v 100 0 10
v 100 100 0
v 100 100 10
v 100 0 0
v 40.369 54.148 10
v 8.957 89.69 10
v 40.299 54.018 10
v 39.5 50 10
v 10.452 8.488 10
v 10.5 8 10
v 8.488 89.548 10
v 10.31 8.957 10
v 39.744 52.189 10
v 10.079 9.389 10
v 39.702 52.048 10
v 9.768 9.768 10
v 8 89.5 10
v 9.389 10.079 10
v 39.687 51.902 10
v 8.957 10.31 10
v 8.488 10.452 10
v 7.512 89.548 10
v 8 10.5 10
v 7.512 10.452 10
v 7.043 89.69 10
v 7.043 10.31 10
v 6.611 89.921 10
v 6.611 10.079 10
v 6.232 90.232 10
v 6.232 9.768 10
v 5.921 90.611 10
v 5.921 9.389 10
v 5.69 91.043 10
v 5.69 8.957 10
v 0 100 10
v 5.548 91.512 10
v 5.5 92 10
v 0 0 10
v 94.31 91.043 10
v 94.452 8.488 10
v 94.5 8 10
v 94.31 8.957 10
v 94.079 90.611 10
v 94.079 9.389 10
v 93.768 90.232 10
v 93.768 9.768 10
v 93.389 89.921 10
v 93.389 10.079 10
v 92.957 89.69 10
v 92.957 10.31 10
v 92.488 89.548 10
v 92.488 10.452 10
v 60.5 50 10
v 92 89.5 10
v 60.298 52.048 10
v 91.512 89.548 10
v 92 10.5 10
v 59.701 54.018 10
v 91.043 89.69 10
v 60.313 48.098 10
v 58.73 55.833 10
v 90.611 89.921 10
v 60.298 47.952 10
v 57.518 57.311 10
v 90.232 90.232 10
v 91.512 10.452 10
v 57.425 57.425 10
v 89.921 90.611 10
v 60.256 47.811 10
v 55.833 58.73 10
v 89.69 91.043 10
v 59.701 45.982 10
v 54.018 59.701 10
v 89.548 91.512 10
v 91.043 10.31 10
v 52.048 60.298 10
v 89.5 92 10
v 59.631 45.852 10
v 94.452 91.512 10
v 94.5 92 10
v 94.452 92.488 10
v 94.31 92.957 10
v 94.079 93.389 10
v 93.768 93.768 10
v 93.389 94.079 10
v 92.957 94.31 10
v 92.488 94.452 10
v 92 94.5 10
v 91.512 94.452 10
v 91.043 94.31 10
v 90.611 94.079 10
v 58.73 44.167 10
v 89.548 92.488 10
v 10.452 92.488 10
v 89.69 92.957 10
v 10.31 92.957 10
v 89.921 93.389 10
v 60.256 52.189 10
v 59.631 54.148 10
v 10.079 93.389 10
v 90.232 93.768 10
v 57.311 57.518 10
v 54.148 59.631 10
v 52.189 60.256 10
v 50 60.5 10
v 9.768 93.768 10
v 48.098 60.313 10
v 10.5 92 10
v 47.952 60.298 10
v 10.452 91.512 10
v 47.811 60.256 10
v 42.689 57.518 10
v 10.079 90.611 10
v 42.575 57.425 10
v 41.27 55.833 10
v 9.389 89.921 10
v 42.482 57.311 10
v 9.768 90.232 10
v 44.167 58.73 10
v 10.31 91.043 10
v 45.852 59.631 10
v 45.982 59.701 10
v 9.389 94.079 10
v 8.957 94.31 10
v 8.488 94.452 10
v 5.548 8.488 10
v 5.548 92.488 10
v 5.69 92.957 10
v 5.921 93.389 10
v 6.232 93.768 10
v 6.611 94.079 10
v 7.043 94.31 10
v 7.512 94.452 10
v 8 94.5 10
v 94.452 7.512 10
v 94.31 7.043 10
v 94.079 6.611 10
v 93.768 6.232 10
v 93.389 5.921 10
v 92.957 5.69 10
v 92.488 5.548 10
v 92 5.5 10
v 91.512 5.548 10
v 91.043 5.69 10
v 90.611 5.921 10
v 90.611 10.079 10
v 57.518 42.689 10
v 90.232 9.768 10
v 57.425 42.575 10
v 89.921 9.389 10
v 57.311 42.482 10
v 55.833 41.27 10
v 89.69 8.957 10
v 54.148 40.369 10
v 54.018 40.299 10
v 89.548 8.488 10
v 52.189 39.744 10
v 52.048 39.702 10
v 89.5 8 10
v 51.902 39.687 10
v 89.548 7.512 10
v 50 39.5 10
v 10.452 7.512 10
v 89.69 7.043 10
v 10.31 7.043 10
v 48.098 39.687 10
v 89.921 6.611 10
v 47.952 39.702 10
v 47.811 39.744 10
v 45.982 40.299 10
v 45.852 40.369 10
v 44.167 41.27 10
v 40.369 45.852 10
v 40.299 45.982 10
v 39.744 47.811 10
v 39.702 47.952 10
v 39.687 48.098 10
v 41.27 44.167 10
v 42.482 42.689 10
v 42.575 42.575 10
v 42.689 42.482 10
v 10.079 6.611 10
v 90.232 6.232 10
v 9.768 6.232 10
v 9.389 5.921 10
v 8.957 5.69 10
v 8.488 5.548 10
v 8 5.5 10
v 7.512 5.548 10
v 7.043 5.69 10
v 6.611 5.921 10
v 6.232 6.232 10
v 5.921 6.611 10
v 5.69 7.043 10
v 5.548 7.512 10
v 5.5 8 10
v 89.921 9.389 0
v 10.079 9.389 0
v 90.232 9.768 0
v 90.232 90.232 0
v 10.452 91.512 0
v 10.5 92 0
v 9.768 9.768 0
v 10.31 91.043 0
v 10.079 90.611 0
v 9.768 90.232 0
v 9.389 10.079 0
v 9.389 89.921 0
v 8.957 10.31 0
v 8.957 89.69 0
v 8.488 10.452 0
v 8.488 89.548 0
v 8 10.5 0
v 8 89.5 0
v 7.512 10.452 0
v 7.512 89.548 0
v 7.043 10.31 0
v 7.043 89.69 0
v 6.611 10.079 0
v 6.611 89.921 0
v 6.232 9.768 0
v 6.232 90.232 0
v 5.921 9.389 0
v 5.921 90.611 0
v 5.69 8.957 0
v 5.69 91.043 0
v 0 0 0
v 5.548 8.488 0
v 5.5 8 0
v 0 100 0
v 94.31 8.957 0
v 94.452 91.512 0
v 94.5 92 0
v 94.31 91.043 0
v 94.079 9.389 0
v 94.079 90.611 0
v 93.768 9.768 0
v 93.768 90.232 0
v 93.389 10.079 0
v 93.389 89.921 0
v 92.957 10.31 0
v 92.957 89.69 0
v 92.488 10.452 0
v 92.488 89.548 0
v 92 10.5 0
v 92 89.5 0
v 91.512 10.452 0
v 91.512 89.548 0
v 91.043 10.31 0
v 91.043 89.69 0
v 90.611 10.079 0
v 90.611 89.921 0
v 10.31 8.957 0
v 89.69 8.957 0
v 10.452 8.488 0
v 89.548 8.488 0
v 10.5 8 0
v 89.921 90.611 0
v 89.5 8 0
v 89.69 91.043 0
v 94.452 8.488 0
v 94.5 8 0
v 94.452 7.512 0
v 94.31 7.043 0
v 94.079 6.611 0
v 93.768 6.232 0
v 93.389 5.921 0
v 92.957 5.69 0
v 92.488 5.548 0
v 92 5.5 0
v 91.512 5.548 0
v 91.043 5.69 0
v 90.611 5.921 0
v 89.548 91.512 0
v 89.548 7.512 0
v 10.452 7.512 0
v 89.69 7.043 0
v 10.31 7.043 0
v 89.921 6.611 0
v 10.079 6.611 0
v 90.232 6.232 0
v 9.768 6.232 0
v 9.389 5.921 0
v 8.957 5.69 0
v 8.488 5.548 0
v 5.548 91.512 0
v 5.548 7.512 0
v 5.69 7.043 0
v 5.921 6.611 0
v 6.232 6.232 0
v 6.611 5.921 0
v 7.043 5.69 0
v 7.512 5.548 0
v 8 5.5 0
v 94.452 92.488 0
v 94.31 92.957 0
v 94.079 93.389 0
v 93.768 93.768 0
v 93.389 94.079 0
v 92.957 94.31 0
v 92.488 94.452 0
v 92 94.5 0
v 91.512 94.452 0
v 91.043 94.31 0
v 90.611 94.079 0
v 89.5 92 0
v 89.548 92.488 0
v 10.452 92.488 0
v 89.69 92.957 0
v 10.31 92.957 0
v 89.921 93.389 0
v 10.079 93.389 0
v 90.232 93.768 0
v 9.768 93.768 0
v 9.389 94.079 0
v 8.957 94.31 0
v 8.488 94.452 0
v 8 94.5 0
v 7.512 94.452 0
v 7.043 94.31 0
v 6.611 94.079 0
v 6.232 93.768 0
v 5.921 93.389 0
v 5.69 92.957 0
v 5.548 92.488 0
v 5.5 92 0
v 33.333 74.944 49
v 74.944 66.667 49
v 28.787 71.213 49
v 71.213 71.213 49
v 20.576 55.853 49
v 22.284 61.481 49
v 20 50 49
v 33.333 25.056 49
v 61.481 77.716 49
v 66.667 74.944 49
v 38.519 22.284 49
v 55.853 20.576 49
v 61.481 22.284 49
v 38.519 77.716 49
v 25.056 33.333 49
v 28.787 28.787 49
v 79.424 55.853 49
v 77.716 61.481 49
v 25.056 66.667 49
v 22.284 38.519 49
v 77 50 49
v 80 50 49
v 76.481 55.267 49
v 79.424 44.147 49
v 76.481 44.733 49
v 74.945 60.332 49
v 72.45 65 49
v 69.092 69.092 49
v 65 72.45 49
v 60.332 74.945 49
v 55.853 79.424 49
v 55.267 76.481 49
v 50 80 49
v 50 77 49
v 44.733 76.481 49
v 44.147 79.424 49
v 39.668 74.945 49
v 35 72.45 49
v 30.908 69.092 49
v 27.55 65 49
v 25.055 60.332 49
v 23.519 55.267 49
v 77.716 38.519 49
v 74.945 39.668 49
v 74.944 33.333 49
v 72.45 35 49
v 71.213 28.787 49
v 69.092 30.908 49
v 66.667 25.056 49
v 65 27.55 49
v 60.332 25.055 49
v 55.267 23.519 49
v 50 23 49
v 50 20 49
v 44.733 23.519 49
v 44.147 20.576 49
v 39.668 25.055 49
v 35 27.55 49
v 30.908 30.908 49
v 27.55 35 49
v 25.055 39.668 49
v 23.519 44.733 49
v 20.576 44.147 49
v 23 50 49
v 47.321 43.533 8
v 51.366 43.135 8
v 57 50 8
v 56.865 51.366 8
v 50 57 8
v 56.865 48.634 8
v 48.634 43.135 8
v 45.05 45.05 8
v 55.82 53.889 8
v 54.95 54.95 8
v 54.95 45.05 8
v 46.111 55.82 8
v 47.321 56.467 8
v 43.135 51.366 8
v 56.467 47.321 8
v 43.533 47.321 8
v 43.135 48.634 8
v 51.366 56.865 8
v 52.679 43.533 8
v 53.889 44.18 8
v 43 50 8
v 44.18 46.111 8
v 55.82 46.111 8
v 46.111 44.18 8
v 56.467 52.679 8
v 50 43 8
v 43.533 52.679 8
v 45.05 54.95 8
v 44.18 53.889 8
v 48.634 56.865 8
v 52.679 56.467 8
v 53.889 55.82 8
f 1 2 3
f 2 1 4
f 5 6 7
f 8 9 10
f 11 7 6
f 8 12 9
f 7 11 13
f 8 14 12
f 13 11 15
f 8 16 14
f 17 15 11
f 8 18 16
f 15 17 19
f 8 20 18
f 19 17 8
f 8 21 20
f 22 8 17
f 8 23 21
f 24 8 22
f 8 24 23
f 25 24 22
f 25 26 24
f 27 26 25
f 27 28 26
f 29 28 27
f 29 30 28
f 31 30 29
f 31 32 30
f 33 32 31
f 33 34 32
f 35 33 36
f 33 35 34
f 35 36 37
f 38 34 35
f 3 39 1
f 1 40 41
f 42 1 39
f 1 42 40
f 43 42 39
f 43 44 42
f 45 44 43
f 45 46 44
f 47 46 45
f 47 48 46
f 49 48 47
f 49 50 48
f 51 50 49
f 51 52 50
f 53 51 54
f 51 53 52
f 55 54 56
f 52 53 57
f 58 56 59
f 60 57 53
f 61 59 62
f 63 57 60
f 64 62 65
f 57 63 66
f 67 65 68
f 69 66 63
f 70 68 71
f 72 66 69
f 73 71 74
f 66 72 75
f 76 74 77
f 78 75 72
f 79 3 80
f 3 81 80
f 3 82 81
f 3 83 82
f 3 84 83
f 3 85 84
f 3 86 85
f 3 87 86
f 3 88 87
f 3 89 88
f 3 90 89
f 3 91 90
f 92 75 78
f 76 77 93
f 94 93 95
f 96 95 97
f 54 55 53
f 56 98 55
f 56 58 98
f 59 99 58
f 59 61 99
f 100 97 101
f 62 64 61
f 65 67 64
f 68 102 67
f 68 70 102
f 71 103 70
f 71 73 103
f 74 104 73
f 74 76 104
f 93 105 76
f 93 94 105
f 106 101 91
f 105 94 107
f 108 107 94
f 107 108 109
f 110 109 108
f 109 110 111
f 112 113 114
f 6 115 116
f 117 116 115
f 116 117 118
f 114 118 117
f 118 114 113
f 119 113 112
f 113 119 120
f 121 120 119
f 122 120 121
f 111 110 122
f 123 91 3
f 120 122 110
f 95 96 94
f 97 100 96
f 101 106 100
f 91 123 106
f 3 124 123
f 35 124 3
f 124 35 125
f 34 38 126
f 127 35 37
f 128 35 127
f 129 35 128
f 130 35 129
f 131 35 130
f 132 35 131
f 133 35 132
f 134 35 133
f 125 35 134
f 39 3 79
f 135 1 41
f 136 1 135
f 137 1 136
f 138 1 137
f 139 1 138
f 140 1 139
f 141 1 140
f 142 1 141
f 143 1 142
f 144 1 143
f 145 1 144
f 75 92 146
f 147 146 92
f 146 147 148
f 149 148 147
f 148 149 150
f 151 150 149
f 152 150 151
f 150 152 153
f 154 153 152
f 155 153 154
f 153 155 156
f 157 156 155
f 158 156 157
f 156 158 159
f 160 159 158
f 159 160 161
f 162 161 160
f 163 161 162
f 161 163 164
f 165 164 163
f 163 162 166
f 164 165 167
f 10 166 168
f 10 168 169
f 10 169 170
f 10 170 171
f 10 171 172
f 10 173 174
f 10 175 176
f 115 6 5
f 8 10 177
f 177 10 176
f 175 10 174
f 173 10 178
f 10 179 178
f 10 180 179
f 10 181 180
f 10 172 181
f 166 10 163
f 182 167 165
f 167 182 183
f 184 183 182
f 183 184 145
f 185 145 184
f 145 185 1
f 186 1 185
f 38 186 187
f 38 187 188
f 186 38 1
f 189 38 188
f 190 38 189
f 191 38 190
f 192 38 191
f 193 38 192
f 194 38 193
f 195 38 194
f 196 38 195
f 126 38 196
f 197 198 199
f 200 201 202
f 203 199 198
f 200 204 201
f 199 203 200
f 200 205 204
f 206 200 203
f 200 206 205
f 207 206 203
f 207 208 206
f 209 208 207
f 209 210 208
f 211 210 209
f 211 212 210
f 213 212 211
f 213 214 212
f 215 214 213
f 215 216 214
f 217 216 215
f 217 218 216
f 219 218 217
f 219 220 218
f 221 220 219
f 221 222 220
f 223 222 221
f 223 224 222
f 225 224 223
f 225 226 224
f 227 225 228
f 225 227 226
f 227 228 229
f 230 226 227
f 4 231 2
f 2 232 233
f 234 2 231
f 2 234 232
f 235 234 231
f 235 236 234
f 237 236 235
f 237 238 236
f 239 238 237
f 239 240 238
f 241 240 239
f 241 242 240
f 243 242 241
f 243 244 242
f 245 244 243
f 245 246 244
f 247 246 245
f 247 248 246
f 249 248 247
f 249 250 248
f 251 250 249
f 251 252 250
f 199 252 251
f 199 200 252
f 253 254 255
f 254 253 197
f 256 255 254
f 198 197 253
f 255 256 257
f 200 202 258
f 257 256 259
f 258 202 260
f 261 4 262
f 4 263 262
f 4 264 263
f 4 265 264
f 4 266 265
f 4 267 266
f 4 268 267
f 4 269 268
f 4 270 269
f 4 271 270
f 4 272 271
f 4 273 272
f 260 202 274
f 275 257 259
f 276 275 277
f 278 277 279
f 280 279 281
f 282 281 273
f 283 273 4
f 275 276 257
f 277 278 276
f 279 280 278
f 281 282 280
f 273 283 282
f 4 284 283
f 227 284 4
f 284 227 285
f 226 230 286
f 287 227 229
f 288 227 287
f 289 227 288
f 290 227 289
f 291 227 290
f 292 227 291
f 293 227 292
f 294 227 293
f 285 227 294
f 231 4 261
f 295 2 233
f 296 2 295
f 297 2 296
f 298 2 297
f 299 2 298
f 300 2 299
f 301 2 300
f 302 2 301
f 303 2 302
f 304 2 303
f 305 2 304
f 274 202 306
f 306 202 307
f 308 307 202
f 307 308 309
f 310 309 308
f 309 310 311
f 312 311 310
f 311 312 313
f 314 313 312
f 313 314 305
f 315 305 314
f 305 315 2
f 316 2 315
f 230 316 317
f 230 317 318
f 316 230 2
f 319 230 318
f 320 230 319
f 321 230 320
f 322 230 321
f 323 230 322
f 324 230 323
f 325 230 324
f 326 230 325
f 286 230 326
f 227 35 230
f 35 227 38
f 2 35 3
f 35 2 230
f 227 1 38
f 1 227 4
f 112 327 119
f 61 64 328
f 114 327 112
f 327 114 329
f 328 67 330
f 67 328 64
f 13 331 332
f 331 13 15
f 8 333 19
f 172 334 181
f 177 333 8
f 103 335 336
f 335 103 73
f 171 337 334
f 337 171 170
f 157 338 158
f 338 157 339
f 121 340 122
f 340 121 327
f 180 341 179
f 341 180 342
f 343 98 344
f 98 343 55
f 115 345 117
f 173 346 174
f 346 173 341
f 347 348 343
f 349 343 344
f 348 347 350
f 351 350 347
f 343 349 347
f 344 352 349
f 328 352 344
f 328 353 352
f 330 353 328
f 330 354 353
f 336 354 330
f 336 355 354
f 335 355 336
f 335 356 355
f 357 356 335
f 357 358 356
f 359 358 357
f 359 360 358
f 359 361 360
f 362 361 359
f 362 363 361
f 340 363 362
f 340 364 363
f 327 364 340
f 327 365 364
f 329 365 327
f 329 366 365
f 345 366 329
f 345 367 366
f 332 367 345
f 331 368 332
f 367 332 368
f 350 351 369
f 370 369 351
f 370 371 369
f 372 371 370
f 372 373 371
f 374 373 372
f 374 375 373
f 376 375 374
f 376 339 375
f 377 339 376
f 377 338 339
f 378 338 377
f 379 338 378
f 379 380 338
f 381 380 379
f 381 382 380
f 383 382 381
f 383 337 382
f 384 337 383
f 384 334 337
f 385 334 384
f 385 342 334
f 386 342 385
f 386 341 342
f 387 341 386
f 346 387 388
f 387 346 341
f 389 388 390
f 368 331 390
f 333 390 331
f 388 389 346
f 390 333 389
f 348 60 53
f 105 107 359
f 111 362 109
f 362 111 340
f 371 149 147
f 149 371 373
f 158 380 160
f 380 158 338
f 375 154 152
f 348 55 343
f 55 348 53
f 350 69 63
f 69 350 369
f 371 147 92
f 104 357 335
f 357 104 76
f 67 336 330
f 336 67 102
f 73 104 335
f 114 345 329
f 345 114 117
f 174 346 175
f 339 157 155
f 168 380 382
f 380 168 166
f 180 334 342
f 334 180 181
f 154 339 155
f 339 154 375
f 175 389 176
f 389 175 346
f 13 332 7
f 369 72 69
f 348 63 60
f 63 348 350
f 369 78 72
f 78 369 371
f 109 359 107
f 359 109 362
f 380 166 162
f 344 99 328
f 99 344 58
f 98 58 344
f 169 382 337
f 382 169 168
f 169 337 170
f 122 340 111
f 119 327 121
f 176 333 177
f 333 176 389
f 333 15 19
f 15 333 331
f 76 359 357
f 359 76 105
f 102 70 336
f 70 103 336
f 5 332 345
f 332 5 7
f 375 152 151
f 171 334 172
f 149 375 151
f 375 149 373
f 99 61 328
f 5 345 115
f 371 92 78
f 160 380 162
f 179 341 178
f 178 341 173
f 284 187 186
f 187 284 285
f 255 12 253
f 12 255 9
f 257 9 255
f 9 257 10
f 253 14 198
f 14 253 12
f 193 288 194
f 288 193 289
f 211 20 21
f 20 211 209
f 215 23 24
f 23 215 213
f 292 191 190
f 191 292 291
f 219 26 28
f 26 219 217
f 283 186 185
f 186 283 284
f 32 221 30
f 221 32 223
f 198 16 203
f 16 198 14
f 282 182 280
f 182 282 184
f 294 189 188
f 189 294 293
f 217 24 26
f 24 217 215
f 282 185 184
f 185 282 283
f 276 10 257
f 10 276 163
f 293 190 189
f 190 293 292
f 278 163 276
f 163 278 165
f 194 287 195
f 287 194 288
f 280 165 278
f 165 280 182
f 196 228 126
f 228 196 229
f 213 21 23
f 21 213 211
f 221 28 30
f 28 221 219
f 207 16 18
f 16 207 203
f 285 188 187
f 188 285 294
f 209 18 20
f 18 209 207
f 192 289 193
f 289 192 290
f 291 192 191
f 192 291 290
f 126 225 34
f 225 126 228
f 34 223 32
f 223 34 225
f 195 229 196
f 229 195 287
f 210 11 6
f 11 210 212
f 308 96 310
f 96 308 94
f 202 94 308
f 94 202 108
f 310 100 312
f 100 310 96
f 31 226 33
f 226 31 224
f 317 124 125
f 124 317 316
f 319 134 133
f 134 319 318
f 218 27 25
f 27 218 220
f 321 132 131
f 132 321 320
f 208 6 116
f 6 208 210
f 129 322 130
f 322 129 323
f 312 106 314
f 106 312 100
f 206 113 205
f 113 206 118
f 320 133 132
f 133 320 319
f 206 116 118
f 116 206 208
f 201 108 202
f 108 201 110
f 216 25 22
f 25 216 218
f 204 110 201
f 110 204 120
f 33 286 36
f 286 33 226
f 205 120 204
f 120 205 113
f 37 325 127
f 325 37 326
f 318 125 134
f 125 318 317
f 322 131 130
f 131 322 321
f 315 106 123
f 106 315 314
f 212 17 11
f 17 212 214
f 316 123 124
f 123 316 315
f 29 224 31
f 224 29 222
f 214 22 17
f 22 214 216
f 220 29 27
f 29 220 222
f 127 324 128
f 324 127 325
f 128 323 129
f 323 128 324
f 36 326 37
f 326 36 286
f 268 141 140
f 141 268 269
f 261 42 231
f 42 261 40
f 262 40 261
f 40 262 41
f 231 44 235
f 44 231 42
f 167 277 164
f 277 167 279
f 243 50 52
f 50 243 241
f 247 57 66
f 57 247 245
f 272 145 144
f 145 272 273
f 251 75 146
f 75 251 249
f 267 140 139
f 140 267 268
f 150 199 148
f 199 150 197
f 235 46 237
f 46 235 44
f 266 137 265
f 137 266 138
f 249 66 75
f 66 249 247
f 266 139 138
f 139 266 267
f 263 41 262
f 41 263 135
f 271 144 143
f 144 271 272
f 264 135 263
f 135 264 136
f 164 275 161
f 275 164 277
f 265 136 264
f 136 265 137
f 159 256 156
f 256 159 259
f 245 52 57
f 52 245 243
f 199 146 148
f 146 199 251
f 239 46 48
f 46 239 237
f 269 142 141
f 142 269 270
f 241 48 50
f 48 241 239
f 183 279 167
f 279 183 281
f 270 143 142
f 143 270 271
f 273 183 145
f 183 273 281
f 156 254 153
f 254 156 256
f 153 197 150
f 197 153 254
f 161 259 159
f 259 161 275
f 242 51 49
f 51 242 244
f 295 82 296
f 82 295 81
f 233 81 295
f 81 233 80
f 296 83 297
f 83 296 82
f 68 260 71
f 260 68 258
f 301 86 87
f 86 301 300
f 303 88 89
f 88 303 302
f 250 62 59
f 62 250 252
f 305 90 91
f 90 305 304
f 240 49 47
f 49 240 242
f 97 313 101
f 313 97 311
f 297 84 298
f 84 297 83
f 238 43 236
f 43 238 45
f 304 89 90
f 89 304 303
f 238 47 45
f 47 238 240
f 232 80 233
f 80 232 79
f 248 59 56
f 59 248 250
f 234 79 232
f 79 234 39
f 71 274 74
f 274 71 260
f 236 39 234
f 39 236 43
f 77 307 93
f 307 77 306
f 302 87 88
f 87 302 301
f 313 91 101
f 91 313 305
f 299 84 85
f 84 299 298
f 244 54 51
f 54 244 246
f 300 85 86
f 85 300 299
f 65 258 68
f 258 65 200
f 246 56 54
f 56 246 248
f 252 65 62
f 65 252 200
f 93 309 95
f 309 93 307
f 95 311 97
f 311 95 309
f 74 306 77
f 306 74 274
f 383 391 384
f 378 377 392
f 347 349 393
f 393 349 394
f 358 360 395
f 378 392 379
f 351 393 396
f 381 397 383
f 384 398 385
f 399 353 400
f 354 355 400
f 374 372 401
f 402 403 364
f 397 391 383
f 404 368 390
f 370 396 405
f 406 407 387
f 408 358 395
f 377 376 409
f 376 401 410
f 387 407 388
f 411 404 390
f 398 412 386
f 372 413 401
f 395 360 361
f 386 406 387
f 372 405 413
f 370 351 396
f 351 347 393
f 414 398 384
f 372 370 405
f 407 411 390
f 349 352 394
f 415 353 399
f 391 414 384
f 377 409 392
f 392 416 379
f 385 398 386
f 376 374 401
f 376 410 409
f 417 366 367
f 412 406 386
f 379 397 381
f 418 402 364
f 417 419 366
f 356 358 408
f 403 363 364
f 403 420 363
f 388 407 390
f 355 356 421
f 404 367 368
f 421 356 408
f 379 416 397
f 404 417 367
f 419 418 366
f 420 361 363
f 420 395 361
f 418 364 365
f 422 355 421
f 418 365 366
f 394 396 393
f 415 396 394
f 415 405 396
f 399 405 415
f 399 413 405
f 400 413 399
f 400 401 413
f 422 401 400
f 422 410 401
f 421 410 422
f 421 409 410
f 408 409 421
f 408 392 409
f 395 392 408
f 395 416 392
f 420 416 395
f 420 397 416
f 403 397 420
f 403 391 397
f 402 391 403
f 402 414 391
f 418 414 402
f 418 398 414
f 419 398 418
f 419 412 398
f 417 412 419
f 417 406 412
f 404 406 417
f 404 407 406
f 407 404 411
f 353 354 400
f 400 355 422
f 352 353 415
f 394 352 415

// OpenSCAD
$fn = 32;

// ----------------------------------------------------------------------
// Hopper: flanged with square flange
// ----------------------------------------------------------------------

// --- parameters (mm) ---
fl = 100;                 // flange side, X and Y
fl_t = 10;                // flange thickness
cone_h = 40;              // cone height above the flange
top_d = 60;               // cone mouth diameter
bot_d = 20;               // cone spout diameter
wall = 3;                 // cone wall thickness
hole_r = 2.5;             // flange hole radius
hole_in = 8;              // hole inset from the corners

bore_d = bot_d - 2 * wall;  // spout bore diameter
total_h = fl_t + cone_h - 1;  // overall height

difference() {
  union() {
    cube([fl, fl, fl_t]);
    translate([fl / 2, fl / 2, fl_t - 1])
      cylinder(h = cone_h, d1 = bot_d, d2 = top_d);
  }
  translate([fl / 2, fl / 2, fl_t - 2])
    cylinder(h = cone_h + 1, d1 = bore_d, d2 = top_d - 2 * wall);
  for (sx = [0, 1], sy = [0, 1])
    translate([sx ? fl - hole_in : hole_in,
               sy ? fl - hole_in : hole_in, -1])
      cylinder(r = hole_r, h = fl_t + 2);
}
